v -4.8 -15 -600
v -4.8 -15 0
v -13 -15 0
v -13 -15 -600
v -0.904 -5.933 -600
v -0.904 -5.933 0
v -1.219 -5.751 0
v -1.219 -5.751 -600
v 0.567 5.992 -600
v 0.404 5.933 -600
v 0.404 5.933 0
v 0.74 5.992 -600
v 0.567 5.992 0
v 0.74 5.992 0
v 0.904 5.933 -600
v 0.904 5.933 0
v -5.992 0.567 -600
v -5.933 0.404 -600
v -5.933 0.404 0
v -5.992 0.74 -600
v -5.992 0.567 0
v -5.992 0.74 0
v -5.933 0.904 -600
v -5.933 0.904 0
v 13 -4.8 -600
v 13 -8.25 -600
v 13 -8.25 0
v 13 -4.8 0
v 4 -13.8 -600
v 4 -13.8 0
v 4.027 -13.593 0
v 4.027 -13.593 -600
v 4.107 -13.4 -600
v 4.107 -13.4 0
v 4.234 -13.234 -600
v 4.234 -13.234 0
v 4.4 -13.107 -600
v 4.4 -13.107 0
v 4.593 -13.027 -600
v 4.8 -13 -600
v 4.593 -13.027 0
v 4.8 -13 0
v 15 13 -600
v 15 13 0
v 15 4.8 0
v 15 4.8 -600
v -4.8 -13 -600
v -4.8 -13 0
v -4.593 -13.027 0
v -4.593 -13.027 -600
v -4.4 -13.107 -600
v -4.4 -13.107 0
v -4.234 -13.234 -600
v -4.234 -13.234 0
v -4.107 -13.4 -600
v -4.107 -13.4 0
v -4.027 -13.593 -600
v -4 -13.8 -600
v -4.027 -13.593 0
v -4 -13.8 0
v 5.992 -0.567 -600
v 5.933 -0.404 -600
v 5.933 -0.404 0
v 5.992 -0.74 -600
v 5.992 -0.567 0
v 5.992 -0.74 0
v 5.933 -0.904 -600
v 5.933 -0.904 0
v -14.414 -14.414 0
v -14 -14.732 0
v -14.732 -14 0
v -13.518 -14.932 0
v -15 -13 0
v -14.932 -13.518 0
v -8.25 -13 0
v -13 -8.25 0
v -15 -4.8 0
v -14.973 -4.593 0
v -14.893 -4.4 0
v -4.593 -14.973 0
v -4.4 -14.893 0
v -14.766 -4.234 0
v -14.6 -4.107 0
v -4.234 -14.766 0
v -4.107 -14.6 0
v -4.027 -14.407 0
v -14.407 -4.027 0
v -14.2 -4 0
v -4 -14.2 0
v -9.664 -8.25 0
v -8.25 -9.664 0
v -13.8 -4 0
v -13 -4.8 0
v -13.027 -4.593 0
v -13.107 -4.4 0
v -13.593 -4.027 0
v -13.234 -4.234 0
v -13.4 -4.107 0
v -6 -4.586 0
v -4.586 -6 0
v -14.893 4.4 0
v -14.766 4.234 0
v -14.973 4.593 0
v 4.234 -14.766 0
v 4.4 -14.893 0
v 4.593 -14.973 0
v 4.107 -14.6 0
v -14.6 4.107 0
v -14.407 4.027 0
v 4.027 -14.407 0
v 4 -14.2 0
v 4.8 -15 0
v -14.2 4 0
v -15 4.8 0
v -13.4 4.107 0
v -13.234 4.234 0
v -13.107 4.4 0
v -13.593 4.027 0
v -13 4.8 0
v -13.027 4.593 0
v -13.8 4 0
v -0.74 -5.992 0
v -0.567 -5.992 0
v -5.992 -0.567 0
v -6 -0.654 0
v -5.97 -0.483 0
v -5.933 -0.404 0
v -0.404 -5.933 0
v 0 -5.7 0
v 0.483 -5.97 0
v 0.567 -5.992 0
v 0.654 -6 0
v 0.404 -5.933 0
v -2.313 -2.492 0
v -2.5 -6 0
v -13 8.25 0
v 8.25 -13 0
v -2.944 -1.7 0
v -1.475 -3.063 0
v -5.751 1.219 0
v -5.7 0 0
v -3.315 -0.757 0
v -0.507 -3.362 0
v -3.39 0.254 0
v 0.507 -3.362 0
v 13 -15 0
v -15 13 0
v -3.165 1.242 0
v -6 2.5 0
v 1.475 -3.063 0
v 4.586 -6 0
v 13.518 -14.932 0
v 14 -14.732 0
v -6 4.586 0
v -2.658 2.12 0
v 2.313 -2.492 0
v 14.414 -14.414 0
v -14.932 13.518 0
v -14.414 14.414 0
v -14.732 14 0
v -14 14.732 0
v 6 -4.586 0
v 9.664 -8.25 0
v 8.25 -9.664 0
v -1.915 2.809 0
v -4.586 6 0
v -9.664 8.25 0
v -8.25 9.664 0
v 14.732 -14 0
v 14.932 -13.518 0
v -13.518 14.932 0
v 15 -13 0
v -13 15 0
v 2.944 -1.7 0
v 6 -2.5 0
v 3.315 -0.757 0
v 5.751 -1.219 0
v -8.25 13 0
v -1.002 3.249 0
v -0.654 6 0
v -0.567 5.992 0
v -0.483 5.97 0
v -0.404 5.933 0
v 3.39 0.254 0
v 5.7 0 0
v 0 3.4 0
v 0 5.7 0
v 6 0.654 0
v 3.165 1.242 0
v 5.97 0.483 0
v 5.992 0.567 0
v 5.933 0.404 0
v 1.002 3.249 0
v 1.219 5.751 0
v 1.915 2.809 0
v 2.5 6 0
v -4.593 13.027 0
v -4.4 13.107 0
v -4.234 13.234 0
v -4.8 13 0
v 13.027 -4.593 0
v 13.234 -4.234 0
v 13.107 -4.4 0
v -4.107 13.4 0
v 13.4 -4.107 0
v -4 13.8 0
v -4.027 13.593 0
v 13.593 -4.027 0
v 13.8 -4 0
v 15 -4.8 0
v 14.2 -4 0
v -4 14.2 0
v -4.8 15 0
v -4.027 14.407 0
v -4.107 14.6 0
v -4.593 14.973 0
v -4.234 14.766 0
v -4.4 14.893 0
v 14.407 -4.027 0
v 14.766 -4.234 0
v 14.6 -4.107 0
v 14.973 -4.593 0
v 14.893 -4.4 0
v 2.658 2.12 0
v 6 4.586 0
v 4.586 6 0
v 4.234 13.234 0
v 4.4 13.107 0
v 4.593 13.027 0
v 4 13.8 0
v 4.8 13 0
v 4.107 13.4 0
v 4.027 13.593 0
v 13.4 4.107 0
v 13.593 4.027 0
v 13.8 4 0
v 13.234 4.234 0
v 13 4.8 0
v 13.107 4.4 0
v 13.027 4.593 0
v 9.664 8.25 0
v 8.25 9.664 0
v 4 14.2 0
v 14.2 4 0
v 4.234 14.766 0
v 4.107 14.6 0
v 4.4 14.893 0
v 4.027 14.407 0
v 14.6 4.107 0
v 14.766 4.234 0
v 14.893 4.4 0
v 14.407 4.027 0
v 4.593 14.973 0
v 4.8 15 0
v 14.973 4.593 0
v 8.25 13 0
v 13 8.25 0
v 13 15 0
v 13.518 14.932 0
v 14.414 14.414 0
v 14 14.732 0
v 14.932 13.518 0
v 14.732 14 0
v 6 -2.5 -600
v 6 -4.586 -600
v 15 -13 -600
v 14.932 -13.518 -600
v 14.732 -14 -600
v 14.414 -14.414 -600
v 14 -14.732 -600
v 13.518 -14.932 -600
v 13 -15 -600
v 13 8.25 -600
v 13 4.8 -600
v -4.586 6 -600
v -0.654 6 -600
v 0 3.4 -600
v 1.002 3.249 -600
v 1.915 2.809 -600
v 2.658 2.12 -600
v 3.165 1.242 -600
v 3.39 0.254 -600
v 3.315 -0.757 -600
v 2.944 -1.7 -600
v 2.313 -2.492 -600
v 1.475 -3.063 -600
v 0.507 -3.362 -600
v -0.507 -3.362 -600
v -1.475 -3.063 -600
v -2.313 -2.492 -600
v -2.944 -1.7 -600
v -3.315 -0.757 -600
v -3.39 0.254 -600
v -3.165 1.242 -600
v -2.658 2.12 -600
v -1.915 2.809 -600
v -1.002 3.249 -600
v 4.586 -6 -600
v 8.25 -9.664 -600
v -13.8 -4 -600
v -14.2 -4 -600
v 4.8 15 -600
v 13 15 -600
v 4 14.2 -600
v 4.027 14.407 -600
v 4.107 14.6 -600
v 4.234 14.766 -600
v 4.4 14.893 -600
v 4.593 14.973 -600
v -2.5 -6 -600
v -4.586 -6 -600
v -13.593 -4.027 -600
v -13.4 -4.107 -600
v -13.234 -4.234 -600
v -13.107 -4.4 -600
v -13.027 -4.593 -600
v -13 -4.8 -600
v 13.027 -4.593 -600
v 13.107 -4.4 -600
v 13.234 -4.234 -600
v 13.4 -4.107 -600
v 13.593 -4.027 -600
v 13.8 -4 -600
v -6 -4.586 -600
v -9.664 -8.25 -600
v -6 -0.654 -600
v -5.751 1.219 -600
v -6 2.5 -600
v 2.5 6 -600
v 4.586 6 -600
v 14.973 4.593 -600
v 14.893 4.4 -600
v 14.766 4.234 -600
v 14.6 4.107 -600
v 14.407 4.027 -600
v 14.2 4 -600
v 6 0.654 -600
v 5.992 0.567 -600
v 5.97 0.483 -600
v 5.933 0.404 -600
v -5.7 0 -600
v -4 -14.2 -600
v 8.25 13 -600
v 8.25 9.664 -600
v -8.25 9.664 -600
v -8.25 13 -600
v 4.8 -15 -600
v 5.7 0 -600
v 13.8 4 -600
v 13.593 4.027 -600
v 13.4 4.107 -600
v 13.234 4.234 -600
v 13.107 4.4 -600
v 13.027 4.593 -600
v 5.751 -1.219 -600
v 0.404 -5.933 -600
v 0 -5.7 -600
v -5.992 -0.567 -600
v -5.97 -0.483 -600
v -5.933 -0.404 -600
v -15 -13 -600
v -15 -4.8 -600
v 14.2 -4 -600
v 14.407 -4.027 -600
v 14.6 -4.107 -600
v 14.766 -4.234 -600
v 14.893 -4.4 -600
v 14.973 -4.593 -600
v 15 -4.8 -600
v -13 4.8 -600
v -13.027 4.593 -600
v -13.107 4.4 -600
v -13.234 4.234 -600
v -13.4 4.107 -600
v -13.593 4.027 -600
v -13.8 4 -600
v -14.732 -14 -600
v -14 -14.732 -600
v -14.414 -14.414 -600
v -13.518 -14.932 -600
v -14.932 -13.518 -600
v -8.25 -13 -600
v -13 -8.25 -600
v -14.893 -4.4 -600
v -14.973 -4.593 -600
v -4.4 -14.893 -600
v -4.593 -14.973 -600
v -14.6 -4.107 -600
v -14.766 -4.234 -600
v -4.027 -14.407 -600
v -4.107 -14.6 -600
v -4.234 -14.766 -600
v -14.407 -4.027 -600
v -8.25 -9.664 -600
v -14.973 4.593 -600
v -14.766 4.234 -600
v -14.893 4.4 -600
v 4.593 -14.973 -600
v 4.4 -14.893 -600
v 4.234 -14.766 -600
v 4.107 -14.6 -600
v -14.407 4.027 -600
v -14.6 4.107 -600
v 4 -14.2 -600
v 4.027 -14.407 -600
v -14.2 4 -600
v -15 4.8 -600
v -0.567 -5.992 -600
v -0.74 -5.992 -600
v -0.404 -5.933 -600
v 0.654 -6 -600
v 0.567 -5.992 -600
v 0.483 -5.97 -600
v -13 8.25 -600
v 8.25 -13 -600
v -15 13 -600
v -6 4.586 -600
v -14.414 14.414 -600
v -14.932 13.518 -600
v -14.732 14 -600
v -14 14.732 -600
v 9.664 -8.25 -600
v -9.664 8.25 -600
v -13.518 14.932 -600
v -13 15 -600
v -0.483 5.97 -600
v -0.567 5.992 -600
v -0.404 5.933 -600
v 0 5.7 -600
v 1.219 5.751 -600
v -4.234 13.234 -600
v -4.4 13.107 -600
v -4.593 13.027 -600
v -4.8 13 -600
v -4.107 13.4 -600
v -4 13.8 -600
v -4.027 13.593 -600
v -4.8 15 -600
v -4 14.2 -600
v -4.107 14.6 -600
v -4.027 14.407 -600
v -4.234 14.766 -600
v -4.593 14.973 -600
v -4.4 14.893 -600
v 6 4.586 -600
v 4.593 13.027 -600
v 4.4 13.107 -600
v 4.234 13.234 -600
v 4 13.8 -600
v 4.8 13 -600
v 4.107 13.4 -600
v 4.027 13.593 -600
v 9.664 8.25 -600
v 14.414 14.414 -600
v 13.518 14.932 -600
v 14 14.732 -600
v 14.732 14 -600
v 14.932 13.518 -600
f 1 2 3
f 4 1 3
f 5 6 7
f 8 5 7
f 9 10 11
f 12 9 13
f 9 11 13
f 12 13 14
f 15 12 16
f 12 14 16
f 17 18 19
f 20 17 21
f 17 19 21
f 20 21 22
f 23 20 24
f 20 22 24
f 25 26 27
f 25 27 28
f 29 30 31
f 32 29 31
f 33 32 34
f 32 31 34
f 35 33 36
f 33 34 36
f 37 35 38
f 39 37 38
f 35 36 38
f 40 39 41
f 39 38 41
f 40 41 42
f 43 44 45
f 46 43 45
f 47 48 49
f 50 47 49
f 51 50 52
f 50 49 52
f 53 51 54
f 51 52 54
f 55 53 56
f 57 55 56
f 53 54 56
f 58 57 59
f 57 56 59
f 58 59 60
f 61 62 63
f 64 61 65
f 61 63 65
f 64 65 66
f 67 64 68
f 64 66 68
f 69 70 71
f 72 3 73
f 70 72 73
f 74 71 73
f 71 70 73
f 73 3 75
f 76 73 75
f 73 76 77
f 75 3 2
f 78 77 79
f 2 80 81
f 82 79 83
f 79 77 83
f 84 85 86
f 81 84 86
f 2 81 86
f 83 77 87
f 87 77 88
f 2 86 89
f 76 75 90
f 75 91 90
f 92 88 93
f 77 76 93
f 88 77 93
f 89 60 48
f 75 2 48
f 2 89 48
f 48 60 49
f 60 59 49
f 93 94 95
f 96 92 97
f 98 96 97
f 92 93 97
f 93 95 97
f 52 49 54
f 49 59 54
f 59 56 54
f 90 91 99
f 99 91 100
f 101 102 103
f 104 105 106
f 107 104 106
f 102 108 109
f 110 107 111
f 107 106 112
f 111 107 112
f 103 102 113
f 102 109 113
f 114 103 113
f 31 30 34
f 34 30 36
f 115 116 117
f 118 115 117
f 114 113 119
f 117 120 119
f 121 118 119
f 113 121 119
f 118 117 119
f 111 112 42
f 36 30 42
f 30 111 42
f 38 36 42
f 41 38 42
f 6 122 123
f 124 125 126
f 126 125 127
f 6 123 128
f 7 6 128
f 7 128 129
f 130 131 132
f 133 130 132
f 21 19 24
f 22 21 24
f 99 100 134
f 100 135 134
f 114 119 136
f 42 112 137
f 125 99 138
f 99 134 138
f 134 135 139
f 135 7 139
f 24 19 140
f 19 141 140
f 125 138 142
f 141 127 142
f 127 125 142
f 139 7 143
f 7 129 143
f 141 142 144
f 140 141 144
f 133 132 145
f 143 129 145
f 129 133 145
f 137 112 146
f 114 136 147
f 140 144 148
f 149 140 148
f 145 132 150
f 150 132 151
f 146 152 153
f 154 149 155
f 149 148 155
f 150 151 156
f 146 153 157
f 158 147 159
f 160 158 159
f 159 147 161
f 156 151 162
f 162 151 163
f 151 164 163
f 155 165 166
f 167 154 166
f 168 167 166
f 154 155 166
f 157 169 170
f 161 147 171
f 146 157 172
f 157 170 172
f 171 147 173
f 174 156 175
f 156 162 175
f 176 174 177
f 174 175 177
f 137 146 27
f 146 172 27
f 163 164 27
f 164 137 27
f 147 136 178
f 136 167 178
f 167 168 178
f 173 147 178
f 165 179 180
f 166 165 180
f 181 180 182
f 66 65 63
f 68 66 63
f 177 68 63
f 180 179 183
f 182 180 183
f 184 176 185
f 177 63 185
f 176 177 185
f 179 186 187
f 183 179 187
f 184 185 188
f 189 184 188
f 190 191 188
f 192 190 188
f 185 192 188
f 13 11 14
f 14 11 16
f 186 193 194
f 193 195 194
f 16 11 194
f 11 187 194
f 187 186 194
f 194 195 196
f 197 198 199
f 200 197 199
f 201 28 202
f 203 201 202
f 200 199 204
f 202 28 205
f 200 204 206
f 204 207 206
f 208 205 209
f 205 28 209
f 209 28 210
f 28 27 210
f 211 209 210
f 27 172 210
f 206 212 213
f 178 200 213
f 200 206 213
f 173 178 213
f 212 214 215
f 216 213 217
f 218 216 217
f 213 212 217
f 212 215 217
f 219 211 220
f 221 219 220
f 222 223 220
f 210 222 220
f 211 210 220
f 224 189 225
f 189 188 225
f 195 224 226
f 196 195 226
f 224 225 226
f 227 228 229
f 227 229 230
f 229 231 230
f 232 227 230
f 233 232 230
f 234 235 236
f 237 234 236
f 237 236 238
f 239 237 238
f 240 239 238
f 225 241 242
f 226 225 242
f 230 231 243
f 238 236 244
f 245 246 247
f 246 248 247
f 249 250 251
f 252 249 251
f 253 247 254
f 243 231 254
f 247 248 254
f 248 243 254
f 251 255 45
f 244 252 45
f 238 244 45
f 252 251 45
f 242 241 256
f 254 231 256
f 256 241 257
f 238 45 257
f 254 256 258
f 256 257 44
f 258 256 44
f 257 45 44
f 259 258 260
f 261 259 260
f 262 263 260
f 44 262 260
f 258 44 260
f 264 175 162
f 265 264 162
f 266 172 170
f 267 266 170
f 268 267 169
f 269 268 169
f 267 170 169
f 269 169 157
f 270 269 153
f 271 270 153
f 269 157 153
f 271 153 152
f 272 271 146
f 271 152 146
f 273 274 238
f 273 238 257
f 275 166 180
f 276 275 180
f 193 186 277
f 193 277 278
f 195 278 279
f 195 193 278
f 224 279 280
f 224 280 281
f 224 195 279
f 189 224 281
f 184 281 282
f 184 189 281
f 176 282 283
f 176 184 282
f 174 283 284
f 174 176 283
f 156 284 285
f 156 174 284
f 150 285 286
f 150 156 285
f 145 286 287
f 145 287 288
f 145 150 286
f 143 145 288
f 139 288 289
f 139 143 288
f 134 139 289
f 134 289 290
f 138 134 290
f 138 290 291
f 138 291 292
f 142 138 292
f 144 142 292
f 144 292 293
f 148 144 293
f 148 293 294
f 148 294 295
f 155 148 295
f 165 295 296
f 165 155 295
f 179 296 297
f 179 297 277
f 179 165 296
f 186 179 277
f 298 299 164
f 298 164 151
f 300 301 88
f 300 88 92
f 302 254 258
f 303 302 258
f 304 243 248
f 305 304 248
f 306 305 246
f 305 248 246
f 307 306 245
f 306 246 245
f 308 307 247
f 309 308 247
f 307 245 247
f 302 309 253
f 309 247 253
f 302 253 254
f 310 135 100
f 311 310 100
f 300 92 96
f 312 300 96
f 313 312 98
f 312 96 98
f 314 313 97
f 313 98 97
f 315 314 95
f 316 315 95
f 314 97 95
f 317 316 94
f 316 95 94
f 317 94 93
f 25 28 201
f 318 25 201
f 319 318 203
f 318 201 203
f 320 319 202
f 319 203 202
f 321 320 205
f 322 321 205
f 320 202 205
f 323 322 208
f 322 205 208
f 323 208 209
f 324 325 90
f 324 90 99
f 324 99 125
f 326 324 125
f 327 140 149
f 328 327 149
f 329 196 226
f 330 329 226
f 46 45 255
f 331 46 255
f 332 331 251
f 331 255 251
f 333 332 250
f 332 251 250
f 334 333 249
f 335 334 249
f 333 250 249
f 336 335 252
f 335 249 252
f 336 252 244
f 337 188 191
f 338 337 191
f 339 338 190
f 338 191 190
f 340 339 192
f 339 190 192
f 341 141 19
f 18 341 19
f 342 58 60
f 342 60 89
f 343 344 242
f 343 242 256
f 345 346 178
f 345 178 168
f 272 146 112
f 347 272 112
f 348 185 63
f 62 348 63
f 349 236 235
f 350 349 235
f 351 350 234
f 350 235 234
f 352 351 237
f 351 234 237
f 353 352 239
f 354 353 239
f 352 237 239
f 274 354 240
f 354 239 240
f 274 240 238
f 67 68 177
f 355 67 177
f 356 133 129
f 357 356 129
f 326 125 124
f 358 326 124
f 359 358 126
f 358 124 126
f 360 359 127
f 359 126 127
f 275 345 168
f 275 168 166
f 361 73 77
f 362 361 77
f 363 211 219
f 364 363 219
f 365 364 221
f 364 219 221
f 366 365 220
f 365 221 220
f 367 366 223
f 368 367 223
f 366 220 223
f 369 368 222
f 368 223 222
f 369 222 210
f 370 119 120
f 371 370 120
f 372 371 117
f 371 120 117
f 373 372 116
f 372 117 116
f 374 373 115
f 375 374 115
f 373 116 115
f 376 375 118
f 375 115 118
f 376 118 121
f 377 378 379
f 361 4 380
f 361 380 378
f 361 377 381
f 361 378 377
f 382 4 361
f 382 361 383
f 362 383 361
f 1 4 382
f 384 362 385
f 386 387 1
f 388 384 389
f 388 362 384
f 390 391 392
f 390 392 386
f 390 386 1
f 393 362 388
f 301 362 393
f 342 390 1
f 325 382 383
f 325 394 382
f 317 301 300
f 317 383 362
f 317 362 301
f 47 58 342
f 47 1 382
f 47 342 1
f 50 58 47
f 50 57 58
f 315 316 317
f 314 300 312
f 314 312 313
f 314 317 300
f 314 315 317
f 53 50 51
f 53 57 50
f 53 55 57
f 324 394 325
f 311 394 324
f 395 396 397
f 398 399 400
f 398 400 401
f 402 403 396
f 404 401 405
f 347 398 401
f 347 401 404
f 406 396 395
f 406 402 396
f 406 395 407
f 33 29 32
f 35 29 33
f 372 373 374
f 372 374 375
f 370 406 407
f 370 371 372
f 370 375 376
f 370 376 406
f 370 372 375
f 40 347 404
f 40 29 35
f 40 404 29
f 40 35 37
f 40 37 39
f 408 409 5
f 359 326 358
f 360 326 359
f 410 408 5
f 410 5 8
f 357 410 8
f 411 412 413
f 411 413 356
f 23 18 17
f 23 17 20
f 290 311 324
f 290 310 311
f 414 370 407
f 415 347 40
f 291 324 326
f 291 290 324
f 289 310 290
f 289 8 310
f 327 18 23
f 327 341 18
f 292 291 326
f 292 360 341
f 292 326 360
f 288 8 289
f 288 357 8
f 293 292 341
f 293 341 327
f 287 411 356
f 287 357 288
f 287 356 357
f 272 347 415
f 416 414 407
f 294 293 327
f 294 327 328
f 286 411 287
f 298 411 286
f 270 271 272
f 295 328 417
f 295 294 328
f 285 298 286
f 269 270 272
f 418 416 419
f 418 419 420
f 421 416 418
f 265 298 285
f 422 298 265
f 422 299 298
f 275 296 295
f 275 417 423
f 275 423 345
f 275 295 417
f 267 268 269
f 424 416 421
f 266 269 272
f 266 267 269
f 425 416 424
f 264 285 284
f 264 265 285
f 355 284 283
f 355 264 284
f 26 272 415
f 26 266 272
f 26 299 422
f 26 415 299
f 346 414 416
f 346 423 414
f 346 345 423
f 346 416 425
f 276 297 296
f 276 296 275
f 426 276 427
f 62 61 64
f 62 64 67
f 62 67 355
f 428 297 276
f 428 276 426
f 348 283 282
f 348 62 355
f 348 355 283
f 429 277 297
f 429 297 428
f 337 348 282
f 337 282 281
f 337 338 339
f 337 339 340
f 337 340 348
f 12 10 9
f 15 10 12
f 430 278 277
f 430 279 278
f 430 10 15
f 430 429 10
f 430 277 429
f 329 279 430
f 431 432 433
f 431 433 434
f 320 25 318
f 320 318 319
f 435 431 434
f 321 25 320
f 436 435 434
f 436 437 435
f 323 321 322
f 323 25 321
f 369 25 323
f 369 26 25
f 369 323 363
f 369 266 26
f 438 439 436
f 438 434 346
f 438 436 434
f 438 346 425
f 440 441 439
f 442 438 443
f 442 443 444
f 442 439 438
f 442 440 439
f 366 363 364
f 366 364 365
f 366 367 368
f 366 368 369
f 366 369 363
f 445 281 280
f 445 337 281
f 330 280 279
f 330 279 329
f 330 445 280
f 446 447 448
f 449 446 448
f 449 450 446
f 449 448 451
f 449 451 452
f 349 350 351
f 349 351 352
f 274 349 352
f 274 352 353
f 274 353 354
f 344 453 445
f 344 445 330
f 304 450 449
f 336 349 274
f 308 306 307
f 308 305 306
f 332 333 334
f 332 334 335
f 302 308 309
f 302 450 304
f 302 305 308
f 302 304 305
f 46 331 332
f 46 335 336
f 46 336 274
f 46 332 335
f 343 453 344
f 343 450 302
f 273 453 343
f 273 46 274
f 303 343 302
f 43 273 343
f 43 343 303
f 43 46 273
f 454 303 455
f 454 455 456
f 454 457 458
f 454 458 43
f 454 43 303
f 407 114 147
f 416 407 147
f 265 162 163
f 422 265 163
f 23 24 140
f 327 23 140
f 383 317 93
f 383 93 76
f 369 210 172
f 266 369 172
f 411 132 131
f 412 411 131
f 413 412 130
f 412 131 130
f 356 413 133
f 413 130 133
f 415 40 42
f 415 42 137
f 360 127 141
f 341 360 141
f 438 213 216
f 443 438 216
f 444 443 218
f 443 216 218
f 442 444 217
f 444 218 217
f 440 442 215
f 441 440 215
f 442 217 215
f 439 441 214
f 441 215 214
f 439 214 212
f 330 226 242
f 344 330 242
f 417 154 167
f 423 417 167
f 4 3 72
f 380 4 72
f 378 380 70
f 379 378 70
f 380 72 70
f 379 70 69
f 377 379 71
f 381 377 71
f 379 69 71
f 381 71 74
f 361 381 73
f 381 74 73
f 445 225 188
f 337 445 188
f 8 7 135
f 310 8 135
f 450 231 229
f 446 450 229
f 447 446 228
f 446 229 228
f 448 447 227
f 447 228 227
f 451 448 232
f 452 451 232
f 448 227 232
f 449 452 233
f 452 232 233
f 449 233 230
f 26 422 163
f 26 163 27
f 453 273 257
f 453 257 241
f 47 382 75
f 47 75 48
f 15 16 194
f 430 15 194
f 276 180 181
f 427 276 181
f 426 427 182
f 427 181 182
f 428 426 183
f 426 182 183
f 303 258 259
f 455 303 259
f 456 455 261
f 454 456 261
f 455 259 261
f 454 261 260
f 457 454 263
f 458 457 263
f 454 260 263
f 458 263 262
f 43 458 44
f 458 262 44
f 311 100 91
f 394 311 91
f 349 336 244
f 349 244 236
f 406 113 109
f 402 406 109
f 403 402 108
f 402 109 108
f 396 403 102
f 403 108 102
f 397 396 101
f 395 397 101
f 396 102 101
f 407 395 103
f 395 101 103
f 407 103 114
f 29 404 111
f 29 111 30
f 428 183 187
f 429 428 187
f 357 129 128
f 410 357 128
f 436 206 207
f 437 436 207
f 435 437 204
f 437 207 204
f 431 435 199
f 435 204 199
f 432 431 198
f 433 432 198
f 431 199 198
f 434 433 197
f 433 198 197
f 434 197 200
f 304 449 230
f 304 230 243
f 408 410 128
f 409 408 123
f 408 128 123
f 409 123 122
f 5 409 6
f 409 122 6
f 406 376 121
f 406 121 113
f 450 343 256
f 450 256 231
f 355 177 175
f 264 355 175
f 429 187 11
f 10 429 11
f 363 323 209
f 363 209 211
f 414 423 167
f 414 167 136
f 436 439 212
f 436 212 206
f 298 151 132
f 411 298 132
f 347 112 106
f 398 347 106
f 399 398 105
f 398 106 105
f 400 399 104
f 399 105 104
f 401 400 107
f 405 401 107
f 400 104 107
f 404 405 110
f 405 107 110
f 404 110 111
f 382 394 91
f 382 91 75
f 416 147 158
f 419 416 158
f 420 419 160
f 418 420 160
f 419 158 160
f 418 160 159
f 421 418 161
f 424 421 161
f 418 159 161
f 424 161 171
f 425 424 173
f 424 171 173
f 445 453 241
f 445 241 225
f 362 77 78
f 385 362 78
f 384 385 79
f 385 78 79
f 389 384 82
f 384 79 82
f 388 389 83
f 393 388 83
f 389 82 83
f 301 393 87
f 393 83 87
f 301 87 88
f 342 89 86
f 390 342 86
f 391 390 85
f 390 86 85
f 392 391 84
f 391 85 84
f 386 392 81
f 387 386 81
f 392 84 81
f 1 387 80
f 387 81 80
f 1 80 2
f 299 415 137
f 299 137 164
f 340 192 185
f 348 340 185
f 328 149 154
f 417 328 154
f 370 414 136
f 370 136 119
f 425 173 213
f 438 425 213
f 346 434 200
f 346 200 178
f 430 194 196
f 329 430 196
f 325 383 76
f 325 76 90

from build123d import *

# Parameters (mm, degrees)
SKETCH_11_R            = 3.4
F_30_X_30_X_R2_1_DEPTH = 600


with BuildPart() as part:
    # 草图11 → 铝型材 30 X 30 X R2(1) (new body)
    with BuildSketch(Plane.YX):
        with BuildLine():
            Line((-15, -4.8), (-15, -13))
            ThreePointArc((-15, -13), (-14.414213562, -14.414213562), (-13, -15))
            Line((-13, -15), (-4.8, -15))
            ThreePointArc((-4.8, -15), (-4.234314575, -14.765685425), (-4, -14.2))
            Line((-4, -14.2), (-4, -13.8))
            ThreePointArc((-4, -13.8), (-4.234314575, -13.234314575), (-4.8, -13))
            Line((-4.8, -13), (-8.25, -13))
            Line((-8.25, -13), (-8.25, -9.664213562))
            Line((-8.25, -9.664213562), (-4.585786438, -6))
            Line((-4.585786438, -6), (-0.653589838, -6))
            ThreePointArc((-0.653589838, -6), (-0.524180316, -5.982962913), (-0.403589838, -5.933012702))
            Line((-0.403589838, -5.933012702), (0, -5.7))
            Line((0, -5.7), (0.403589838, -5.933012702))
            ThreePointArc((0.403589838, -5.933012702), (0.653589838, -6), (0.903589838, -5.933012702))
            Line((0.903589838, -5.933012702), (1.218885629, -5.750976592))
            Line((1.218885629, -5.750976592), (2.5, -6))
            Line((2.5, -6), (4.585786438, -6))
            Line((4.585786438, -6), (8.25, -9.664213562))
            Line((8.25, -9.664213562), (8.25, -13))
            Line((8.25, -13), (4.8, -13))
            ThreePointArc((4.8, -13), (4.234314575, -13.234314575), (4, -13.8))
            Line((4, -13.8), (4, -14.2))
            ThreePointArc((4, -14.2), (4.234314575, -14.765685425), (4.8, -15))
            Line((4.8, -15), (13, -15))
            ThreePointArc((13, -15), (14.414213562, -14.414213562), (15, -13))
            Line((15, -13), (15, -4.8))
            ThreePointArc((15, -4.8), (14.765685425, -4.234314575), (14.2, -4))
            Line((14.2, -4), (13.8, -4))
            ThreePointArc((13.8, -4), (13.234314575, -4.234314575), (13, -4.8))
            Line((13, -4.8), (13, -8.25))
            Line((13, -8.25), (9.664213562, -8.25))
            Line((9.664213562, -8.25), (6, -4.585786438))
            Line((6, -4.585786438), (6, -0.653589838))
            ThreePointArc((6, -0.653589838), (5.982962913, -0.524180316), (5.933012702, -0.403589838))
            Line((5.933012702, -0.403589838), (5.7, 0))
            Line((5.7, 0), (5.933012702, 0.403589838))
            ThreePointArc((5.933012702, 0.403589838), (6, 0.653589838), (5.933012702, 0.903589838))
            Line((5.933012702, 0.903589838), (5.750976592, 1.218885629))
            Line((5.750976592, 1.218885629), (6, 2.5))
            Line((6, 2.5), (6, 4.585786438))
            Line((6, 4.585786438), (9.664213562, 8.25))
            Line((9.664213562, 8.25), (13, 8.25))
            Line((13, 8.25), (13, 4.8))
            ThreePointArc((13, 4.8), (13.234314575, 4.234314575), (13.8, 4))
            Line((13.8, 4), (14.2, 4))
            ThreePointArc((14.2, 4), (14.765685425, 4.234314575), (15, 4.8))
            Line((15, 4.8), (15, 13))
            ThreePointArc((15, 13), (14.414213562, 14.414213562), (13, 15))
            Line((13, 15), (4.8, 15))
            ThreePointArc((4.8, 15), (4.234314575, 14.765685425), (4, 14.2))
            Line((4, 14.2), (4, 13.8))
            ThreePointArc((4, 13.8), (4.234314575, 13.234314575), (4.8, 13))
            Line((4.8, 13), (8.25, 13))
            Line((8.25, 13), (8.25, 9.664213562))
            Line((8.25, 9.664213562), (4.585786438, 6))
            Line((4.585786438, 6), (0.653589838, 6))
            ThreePointArc((0.653589838, 6), (0.524180316, 5.982962913), (0.403589838, 5.933012702))
            Line((0.403589838, 5.933012702), (0, 5.7))
            Line((0, 5.7), (-0.403589838, 5.933012702))
            ThreePointArc((-0.403589838, 5.933012702), (-0.653589838, 6), (-0.903589838, 5.933012702))
            Line((-0.903589838, 5.933012702), (-1.218885629, 5.750976592))
            Line((-1.218885629, 5.750976592), (-2.5, 6))
            Line((-2.5, 6), (-4.585786438, 6))
            Line((-4.585786438, 6), (-8.25, 9.664213562))
            Line((-8.25, 9.664213562), (-8.25, 13))
            Line((-8.25, 13), (-4.8, 13))
            ThreePointArc((-4.8, 13), (-4.234314575, 13.234314575), (-4, 13.8))
            Line((-4, 13.8), (-4, 14.2))
            ThreePointArc((-4, 14.2), (-4.234314575, 14.765685425), (-4.8, 15))
            Line((-4.8, 15), (-13, 15))
            ThreePointArc((-13, 15), (-14.414213562, 14.414213562), (-15, 13))
            Line((-15, 13), (-15, 4.8))
            ThreePointArc((-15, 4.8), (-14.765685425, 4.234314575), (-14.2, 4))
            Line((-14.2, 4), (-13.8, 4))
            ThreePointArc((-13.8, 4), (-13.234314575, 4.234314575), (-13, 4.8))
            Line((-13, 4.8), (-13, 8.25))
            Line((-13, 8.25), (-9.664213562, 8.25))
            Line((-9.664213562, 8.25), (-6, 4.585786438))
            Line((-6, 4.585786438), (-6, 0.653589838))
            ThreePointArc((-6, 0.653589838), (-5.982962913, 0.524180316), (-5.933012702, 0.403589838))
            Line((-5.933012702, 0.403589838), (-5.7, 0))
            Line((-5.7, 0), (-5.933012702, -0.403589838))
            ThreePointArc((-5.933012702, -0.403589838), (-6, -0.653589838), (-5.933012702, -0.903589838))
            Line((-5.933012702, -0.903589838), (-5.750976592, -1.218885629))
            Line((-5.750976592, -1.218885629), (-6, -2.5))
            Line((-6, -2.5), (-6, -4.585786438))
            Line((-6, -4.585786438), (-9.664213562, -8.25))
            Line((-9.664213562, -8.25), (-13, -8.25))
            Line((-13, -8.25), (-13, -4.8))
            ThreePointArc((-13, -4.8), (-13.234314575, -4.234314575), (-13.8, -4))
            Line((-13.8, -4), (-14.2, -4))
            ThreePointArc((-14.2, -4), (-14.765685425, -4.234314575), (-15, -4.8))
        make_face()
        Circle(SKETCH_11_R, mode=Mode.SUBTRACT)
    extrude(amount=F_30_X_30_X_R2_1_DEPTH)


solid = part.part
